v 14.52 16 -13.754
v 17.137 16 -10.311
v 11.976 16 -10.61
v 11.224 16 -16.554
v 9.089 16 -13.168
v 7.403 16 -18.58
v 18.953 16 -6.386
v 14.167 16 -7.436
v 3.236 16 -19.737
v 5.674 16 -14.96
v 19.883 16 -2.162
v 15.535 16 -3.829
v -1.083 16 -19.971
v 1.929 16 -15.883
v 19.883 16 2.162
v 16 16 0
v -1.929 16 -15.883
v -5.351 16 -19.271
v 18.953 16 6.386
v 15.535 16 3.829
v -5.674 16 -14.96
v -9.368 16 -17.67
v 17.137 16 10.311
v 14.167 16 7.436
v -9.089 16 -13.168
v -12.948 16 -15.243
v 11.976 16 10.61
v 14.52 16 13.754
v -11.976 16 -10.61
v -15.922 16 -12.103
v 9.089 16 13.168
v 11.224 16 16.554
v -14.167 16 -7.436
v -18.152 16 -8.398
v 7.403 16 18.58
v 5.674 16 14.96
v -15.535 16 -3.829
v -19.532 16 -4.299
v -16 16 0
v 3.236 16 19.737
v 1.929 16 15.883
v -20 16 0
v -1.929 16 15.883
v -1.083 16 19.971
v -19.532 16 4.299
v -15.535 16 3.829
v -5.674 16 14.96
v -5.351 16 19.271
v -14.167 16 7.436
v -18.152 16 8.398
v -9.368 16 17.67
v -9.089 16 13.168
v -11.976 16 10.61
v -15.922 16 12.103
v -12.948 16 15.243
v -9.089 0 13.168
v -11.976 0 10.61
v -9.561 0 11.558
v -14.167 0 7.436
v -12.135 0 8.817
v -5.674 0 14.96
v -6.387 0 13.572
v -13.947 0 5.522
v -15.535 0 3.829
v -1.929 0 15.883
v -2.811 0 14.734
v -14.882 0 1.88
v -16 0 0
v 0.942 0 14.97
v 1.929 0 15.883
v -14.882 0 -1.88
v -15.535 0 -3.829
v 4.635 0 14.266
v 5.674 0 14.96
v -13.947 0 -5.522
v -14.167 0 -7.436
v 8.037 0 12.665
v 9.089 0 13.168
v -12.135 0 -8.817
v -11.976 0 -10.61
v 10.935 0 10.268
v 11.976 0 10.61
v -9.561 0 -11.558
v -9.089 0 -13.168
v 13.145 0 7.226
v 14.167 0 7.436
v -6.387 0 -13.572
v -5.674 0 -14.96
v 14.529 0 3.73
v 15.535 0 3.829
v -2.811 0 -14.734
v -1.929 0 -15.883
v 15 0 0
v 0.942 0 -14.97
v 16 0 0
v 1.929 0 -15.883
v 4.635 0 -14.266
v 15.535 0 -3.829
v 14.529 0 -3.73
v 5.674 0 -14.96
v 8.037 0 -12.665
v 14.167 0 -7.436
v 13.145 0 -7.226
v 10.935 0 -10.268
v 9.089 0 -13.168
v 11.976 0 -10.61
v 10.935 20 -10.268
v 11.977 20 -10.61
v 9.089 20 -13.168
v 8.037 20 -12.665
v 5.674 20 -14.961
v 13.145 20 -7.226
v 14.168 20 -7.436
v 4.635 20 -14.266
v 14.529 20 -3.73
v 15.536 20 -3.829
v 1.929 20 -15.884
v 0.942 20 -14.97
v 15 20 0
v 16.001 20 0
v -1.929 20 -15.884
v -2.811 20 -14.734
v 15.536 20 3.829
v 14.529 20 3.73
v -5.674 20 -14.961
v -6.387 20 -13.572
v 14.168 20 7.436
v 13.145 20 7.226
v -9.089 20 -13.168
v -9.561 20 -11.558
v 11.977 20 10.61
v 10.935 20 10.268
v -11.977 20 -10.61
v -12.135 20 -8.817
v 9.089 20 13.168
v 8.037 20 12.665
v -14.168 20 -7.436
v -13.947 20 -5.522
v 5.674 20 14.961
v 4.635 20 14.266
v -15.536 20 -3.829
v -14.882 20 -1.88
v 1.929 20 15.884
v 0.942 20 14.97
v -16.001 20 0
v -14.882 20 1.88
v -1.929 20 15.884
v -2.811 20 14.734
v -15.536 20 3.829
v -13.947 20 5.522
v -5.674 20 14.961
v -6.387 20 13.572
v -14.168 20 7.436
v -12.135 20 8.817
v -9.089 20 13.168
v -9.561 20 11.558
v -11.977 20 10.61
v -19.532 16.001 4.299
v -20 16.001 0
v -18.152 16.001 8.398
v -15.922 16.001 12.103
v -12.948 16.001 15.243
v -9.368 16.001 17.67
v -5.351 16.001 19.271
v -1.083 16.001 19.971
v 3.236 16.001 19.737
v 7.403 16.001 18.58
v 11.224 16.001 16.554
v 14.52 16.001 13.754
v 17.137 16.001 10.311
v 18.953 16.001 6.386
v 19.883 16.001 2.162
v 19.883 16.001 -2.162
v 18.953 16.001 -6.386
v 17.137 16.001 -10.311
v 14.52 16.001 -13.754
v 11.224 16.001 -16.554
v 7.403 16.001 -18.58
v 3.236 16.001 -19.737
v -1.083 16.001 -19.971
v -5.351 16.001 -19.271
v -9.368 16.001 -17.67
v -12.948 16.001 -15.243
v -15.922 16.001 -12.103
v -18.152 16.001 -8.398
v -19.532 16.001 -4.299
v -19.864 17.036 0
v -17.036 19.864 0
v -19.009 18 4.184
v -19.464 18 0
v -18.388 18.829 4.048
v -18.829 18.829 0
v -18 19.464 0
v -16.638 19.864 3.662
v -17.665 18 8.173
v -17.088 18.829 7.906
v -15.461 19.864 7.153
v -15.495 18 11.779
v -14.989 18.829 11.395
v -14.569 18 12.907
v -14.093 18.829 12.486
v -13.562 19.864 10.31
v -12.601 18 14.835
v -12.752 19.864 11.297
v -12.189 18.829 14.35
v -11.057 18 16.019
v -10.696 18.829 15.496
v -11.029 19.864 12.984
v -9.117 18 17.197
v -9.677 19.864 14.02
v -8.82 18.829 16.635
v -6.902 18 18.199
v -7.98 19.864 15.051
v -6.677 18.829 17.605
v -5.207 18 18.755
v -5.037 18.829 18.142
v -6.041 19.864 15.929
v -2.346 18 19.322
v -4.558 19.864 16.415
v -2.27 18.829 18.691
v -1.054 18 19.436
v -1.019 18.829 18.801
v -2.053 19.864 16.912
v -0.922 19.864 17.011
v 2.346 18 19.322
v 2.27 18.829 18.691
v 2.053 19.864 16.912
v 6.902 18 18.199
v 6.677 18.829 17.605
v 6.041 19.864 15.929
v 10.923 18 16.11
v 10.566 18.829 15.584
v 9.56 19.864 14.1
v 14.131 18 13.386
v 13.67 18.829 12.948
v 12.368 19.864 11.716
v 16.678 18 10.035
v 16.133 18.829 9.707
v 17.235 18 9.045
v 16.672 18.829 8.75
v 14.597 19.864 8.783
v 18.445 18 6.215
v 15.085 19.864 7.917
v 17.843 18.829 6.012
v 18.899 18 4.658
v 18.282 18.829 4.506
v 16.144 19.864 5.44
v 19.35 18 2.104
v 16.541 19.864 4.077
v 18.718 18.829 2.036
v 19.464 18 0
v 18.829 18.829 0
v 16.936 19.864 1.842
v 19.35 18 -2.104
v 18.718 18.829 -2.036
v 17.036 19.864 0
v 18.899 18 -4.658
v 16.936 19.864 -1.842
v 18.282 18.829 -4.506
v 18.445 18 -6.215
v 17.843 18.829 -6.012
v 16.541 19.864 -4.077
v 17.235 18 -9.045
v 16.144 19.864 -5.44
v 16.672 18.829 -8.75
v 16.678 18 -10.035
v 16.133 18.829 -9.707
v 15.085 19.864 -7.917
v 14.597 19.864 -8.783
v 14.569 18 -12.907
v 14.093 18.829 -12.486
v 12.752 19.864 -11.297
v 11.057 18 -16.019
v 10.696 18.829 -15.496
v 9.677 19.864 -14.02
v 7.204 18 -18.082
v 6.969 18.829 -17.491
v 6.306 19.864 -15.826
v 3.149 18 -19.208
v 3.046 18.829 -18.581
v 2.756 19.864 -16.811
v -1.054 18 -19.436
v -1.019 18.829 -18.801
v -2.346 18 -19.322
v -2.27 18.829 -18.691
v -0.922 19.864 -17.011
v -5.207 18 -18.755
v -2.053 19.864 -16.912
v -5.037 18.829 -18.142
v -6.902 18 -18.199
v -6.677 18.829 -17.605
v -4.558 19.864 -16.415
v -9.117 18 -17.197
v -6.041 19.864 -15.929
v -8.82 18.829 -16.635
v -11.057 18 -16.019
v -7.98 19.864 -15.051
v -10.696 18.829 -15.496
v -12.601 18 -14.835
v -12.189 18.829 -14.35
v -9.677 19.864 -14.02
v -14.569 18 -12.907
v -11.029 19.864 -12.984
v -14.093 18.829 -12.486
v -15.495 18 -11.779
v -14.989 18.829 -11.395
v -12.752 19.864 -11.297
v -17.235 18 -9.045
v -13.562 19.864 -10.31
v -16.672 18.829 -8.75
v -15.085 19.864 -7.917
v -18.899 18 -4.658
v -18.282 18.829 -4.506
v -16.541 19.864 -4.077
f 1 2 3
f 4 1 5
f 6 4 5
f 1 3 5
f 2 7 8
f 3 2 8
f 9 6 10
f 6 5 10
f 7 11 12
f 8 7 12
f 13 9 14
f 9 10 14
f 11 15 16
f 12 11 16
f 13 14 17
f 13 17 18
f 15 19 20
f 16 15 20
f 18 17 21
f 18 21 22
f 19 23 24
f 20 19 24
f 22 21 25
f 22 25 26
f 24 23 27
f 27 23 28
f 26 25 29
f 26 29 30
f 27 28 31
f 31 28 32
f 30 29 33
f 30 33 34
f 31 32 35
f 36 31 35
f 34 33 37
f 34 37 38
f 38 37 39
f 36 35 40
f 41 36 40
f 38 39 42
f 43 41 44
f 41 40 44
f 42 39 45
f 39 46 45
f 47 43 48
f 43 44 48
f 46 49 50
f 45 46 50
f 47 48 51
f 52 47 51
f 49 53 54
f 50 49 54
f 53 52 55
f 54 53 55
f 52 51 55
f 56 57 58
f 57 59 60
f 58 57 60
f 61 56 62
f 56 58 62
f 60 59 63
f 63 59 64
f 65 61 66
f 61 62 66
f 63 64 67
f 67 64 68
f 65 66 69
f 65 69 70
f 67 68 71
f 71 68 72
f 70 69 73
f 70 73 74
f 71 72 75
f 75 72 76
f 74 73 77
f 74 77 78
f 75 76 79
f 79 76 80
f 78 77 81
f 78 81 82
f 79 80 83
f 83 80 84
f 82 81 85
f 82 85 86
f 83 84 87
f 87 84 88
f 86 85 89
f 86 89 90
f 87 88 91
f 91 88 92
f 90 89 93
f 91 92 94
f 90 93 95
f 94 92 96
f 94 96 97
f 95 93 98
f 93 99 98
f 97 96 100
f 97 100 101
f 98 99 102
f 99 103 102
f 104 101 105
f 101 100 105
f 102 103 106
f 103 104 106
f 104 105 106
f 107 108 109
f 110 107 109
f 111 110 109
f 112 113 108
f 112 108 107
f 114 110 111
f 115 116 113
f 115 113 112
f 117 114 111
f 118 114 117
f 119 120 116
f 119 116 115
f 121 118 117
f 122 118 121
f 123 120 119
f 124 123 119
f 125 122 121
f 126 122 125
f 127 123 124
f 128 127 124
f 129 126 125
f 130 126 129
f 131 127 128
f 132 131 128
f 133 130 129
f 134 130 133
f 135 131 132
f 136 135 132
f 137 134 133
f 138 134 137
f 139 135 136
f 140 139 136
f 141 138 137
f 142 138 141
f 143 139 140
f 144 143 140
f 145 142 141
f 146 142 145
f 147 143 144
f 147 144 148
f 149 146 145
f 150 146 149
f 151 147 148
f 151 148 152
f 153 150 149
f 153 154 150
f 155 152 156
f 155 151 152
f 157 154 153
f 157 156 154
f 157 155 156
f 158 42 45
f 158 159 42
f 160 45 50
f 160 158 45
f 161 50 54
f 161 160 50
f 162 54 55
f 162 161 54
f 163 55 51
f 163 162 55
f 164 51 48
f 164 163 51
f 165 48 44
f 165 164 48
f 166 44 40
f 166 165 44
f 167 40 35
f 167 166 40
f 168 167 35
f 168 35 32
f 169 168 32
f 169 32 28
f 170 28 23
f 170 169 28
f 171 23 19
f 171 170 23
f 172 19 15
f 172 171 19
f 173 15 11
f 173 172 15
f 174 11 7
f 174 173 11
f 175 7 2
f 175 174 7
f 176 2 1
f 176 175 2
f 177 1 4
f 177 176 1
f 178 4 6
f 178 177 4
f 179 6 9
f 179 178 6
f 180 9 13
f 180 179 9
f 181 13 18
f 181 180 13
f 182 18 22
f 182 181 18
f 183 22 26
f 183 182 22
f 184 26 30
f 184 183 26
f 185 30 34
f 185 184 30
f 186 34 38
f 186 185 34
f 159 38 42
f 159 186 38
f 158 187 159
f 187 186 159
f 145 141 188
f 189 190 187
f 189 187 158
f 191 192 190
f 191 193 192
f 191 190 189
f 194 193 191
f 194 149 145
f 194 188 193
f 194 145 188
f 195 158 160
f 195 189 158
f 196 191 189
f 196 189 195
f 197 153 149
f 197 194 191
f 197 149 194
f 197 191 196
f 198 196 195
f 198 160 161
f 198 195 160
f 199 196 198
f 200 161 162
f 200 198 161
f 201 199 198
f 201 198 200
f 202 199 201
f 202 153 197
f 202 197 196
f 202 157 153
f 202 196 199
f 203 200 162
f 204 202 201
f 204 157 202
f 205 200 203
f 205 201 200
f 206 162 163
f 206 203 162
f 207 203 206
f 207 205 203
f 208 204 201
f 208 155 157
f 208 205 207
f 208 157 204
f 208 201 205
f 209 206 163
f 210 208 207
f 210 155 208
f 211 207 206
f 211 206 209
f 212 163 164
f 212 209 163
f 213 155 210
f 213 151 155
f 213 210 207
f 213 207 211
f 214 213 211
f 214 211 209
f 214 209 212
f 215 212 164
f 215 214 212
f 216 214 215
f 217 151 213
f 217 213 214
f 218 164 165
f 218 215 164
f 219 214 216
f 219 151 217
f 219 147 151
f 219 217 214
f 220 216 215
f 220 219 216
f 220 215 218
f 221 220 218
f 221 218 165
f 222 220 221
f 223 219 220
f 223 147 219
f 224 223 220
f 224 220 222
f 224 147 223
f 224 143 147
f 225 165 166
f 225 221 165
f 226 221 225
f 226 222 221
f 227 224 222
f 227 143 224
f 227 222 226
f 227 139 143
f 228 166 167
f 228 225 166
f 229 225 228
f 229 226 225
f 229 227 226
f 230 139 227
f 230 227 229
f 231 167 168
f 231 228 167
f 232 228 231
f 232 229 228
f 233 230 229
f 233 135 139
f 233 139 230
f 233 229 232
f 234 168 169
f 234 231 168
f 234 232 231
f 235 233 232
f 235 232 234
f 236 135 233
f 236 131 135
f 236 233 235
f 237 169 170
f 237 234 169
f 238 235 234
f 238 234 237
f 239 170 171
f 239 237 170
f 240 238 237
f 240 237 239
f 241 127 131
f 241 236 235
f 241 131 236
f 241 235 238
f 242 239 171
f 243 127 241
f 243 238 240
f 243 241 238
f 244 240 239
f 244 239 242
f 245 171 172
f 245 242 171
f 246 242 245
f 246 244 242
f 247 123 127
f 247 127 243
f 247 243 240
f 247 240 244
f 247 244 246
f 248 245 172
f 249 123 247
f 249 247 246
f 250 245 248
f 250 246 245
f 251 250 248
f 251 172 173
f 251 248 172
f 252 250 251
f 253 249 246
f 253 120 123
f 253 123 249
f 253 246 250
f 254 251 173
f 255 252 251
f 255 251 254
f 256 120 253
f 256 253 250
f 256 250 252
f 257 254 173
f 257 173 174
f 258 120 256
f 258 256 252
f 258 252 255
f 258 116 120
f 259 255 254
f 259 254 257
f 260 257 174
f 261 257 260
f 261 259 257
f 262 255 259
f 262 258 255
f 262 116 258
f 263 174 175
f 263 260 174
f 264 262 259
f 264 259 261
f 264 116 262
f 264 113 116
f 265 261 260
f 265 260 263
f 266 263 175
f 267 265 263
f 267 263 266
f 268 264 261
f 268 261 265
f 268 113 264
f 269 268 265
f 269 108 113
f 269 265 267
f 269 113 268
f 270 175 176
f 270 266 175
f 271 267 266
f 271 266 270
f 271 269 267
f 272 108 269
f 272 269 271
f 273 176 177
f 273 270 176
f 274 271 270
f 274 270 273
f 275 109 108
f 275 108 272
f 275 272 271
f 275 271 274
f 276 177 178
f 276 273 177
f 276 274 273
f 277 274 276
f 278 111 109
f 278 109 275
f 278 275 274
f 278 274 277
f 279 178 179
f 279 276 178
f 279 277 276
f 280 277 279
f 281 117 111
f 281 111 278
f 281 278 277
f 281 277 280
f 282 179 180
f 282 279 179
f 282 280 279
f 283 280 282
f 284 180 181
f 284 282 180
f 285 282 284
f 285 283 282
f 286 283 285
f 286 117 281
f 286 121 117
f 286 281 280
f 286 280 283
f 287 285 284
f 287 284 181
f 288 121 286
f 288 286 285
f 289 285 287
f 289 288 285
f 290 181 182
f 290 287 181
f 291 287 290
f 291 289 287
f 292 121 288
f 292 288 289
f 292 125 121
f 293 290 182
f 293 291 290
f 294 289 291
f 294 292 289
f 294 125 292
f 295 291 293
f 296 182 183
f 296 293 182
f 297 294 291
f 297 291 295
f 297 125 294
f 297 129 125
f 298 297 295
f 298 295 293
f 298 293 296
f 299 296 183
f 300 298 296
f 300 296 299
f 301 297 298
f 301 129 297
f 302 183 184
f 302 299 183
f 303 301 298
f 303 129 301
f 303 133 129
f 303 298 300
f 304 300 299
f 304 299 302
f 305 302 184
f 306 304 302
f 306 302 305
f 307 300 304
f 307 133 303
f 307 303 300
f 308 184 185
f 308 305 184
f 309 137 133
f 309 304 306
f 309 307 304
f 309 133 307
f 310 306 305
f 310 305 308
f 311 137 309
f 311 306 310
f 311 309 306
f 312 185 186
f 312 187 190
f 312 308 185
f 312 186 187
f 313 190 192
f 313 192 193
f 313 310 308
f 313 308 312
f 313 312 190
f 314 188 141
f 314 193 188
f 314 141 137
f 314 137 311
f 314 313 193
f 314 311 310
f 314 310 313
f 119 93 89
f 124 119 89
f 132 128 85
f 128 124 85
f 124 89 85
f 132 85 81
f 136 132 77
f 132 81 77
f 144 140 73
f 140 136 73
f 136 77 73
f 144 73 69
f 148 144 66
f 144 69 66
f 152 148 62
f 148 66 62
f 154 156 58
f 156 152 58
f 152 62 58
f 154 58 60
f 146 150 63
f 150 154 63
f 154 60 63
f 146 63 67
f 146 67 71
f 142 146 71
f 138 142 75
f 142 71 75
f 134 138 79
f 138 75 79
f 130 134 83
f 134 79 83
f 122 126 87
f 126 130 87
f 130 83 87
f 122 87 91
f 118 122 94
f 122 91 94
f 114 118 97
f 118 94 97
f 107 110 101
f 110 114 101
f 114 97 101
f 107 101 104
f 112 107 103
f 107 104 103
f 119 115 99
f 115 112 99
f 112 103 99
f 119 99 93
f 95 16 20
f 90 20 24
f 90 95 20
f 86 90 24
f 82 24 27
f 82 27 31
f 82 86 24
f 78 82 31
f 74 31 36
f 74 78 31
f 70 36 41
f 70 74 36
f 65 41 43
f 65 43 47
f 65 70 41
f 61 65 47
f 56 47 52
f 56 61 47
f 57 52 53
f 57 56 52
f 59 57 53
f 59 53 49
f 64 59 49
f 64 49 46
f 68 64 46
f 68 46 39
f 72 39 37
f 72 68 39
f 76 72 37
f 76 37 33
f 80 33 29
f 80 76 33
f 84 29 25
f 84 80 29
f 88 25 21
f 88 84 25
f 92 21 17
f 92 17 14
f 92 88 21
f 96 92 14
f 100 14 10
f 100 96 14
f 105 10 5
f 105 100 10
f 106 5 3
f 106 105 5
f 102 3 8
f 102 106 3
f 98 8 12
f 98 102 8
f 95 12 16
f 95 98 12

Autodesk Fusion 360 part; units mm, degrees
sketch "Sketch1" plane through (0, 0, 0) normal (0, 1, 0) x (1, 0, 0)
  circle A0 centre (0, 0) radius 15
  circle A1 centre (0, 0) radius 17.5
  dimension "d1" = 30
  dimension "d2" = 35
extrude "Extrude1" add sketch "Sketch1" along normal blind 20
sketch "Sketch2" plane through (0, 20, 0) normal (0, 1, 0) x (-1, 0, 0)
  circle A0 centre (0, 0) radius 15
  circle A1 centre (0, 0) radius 17.5
  circle A2 centre (0, 0) radius 16.5
  circle A3 centre (0, 0) radius 17.5
  circle A4 centre (0, 0) radius 19
  circle A5 centre (0, 0) radius 20
  dimension "d5" = 33
  dimension "d10" = 38
  dimension "d13" = 40
extrude "Extrude2" cut sketch "Sketch2" against normal blind 20 contours A1 A3
extrude "Extrude3" add sketch "Sketch2" against normal blind 2 contours A1 A3
extrude "Extrude4" add sketch "Sketch2" against normal blind 4 contours A1 A3 | A4
extrude "Extrude5" add sketch "Sketch2" against normal blind 4 contours A5
sketch "Sketch3" plane through (0, 0, 0) normal (0, -1, 0) x (1, 0, 0)
  circle A0 centre (0, 0) radius 16.5
  circle A1 centre (0, 0) radius 15
  circle A2 centre (0, 0) radius 16
  circle A3 centre (0, 0) radius 16.5
extrude "Extrude6" cut sketch "Sketch3" against normal blind 16 contours A0 A3
fillet "Fillet1" radius 4 1 edges at (18.6465, 20, -7.2323)
